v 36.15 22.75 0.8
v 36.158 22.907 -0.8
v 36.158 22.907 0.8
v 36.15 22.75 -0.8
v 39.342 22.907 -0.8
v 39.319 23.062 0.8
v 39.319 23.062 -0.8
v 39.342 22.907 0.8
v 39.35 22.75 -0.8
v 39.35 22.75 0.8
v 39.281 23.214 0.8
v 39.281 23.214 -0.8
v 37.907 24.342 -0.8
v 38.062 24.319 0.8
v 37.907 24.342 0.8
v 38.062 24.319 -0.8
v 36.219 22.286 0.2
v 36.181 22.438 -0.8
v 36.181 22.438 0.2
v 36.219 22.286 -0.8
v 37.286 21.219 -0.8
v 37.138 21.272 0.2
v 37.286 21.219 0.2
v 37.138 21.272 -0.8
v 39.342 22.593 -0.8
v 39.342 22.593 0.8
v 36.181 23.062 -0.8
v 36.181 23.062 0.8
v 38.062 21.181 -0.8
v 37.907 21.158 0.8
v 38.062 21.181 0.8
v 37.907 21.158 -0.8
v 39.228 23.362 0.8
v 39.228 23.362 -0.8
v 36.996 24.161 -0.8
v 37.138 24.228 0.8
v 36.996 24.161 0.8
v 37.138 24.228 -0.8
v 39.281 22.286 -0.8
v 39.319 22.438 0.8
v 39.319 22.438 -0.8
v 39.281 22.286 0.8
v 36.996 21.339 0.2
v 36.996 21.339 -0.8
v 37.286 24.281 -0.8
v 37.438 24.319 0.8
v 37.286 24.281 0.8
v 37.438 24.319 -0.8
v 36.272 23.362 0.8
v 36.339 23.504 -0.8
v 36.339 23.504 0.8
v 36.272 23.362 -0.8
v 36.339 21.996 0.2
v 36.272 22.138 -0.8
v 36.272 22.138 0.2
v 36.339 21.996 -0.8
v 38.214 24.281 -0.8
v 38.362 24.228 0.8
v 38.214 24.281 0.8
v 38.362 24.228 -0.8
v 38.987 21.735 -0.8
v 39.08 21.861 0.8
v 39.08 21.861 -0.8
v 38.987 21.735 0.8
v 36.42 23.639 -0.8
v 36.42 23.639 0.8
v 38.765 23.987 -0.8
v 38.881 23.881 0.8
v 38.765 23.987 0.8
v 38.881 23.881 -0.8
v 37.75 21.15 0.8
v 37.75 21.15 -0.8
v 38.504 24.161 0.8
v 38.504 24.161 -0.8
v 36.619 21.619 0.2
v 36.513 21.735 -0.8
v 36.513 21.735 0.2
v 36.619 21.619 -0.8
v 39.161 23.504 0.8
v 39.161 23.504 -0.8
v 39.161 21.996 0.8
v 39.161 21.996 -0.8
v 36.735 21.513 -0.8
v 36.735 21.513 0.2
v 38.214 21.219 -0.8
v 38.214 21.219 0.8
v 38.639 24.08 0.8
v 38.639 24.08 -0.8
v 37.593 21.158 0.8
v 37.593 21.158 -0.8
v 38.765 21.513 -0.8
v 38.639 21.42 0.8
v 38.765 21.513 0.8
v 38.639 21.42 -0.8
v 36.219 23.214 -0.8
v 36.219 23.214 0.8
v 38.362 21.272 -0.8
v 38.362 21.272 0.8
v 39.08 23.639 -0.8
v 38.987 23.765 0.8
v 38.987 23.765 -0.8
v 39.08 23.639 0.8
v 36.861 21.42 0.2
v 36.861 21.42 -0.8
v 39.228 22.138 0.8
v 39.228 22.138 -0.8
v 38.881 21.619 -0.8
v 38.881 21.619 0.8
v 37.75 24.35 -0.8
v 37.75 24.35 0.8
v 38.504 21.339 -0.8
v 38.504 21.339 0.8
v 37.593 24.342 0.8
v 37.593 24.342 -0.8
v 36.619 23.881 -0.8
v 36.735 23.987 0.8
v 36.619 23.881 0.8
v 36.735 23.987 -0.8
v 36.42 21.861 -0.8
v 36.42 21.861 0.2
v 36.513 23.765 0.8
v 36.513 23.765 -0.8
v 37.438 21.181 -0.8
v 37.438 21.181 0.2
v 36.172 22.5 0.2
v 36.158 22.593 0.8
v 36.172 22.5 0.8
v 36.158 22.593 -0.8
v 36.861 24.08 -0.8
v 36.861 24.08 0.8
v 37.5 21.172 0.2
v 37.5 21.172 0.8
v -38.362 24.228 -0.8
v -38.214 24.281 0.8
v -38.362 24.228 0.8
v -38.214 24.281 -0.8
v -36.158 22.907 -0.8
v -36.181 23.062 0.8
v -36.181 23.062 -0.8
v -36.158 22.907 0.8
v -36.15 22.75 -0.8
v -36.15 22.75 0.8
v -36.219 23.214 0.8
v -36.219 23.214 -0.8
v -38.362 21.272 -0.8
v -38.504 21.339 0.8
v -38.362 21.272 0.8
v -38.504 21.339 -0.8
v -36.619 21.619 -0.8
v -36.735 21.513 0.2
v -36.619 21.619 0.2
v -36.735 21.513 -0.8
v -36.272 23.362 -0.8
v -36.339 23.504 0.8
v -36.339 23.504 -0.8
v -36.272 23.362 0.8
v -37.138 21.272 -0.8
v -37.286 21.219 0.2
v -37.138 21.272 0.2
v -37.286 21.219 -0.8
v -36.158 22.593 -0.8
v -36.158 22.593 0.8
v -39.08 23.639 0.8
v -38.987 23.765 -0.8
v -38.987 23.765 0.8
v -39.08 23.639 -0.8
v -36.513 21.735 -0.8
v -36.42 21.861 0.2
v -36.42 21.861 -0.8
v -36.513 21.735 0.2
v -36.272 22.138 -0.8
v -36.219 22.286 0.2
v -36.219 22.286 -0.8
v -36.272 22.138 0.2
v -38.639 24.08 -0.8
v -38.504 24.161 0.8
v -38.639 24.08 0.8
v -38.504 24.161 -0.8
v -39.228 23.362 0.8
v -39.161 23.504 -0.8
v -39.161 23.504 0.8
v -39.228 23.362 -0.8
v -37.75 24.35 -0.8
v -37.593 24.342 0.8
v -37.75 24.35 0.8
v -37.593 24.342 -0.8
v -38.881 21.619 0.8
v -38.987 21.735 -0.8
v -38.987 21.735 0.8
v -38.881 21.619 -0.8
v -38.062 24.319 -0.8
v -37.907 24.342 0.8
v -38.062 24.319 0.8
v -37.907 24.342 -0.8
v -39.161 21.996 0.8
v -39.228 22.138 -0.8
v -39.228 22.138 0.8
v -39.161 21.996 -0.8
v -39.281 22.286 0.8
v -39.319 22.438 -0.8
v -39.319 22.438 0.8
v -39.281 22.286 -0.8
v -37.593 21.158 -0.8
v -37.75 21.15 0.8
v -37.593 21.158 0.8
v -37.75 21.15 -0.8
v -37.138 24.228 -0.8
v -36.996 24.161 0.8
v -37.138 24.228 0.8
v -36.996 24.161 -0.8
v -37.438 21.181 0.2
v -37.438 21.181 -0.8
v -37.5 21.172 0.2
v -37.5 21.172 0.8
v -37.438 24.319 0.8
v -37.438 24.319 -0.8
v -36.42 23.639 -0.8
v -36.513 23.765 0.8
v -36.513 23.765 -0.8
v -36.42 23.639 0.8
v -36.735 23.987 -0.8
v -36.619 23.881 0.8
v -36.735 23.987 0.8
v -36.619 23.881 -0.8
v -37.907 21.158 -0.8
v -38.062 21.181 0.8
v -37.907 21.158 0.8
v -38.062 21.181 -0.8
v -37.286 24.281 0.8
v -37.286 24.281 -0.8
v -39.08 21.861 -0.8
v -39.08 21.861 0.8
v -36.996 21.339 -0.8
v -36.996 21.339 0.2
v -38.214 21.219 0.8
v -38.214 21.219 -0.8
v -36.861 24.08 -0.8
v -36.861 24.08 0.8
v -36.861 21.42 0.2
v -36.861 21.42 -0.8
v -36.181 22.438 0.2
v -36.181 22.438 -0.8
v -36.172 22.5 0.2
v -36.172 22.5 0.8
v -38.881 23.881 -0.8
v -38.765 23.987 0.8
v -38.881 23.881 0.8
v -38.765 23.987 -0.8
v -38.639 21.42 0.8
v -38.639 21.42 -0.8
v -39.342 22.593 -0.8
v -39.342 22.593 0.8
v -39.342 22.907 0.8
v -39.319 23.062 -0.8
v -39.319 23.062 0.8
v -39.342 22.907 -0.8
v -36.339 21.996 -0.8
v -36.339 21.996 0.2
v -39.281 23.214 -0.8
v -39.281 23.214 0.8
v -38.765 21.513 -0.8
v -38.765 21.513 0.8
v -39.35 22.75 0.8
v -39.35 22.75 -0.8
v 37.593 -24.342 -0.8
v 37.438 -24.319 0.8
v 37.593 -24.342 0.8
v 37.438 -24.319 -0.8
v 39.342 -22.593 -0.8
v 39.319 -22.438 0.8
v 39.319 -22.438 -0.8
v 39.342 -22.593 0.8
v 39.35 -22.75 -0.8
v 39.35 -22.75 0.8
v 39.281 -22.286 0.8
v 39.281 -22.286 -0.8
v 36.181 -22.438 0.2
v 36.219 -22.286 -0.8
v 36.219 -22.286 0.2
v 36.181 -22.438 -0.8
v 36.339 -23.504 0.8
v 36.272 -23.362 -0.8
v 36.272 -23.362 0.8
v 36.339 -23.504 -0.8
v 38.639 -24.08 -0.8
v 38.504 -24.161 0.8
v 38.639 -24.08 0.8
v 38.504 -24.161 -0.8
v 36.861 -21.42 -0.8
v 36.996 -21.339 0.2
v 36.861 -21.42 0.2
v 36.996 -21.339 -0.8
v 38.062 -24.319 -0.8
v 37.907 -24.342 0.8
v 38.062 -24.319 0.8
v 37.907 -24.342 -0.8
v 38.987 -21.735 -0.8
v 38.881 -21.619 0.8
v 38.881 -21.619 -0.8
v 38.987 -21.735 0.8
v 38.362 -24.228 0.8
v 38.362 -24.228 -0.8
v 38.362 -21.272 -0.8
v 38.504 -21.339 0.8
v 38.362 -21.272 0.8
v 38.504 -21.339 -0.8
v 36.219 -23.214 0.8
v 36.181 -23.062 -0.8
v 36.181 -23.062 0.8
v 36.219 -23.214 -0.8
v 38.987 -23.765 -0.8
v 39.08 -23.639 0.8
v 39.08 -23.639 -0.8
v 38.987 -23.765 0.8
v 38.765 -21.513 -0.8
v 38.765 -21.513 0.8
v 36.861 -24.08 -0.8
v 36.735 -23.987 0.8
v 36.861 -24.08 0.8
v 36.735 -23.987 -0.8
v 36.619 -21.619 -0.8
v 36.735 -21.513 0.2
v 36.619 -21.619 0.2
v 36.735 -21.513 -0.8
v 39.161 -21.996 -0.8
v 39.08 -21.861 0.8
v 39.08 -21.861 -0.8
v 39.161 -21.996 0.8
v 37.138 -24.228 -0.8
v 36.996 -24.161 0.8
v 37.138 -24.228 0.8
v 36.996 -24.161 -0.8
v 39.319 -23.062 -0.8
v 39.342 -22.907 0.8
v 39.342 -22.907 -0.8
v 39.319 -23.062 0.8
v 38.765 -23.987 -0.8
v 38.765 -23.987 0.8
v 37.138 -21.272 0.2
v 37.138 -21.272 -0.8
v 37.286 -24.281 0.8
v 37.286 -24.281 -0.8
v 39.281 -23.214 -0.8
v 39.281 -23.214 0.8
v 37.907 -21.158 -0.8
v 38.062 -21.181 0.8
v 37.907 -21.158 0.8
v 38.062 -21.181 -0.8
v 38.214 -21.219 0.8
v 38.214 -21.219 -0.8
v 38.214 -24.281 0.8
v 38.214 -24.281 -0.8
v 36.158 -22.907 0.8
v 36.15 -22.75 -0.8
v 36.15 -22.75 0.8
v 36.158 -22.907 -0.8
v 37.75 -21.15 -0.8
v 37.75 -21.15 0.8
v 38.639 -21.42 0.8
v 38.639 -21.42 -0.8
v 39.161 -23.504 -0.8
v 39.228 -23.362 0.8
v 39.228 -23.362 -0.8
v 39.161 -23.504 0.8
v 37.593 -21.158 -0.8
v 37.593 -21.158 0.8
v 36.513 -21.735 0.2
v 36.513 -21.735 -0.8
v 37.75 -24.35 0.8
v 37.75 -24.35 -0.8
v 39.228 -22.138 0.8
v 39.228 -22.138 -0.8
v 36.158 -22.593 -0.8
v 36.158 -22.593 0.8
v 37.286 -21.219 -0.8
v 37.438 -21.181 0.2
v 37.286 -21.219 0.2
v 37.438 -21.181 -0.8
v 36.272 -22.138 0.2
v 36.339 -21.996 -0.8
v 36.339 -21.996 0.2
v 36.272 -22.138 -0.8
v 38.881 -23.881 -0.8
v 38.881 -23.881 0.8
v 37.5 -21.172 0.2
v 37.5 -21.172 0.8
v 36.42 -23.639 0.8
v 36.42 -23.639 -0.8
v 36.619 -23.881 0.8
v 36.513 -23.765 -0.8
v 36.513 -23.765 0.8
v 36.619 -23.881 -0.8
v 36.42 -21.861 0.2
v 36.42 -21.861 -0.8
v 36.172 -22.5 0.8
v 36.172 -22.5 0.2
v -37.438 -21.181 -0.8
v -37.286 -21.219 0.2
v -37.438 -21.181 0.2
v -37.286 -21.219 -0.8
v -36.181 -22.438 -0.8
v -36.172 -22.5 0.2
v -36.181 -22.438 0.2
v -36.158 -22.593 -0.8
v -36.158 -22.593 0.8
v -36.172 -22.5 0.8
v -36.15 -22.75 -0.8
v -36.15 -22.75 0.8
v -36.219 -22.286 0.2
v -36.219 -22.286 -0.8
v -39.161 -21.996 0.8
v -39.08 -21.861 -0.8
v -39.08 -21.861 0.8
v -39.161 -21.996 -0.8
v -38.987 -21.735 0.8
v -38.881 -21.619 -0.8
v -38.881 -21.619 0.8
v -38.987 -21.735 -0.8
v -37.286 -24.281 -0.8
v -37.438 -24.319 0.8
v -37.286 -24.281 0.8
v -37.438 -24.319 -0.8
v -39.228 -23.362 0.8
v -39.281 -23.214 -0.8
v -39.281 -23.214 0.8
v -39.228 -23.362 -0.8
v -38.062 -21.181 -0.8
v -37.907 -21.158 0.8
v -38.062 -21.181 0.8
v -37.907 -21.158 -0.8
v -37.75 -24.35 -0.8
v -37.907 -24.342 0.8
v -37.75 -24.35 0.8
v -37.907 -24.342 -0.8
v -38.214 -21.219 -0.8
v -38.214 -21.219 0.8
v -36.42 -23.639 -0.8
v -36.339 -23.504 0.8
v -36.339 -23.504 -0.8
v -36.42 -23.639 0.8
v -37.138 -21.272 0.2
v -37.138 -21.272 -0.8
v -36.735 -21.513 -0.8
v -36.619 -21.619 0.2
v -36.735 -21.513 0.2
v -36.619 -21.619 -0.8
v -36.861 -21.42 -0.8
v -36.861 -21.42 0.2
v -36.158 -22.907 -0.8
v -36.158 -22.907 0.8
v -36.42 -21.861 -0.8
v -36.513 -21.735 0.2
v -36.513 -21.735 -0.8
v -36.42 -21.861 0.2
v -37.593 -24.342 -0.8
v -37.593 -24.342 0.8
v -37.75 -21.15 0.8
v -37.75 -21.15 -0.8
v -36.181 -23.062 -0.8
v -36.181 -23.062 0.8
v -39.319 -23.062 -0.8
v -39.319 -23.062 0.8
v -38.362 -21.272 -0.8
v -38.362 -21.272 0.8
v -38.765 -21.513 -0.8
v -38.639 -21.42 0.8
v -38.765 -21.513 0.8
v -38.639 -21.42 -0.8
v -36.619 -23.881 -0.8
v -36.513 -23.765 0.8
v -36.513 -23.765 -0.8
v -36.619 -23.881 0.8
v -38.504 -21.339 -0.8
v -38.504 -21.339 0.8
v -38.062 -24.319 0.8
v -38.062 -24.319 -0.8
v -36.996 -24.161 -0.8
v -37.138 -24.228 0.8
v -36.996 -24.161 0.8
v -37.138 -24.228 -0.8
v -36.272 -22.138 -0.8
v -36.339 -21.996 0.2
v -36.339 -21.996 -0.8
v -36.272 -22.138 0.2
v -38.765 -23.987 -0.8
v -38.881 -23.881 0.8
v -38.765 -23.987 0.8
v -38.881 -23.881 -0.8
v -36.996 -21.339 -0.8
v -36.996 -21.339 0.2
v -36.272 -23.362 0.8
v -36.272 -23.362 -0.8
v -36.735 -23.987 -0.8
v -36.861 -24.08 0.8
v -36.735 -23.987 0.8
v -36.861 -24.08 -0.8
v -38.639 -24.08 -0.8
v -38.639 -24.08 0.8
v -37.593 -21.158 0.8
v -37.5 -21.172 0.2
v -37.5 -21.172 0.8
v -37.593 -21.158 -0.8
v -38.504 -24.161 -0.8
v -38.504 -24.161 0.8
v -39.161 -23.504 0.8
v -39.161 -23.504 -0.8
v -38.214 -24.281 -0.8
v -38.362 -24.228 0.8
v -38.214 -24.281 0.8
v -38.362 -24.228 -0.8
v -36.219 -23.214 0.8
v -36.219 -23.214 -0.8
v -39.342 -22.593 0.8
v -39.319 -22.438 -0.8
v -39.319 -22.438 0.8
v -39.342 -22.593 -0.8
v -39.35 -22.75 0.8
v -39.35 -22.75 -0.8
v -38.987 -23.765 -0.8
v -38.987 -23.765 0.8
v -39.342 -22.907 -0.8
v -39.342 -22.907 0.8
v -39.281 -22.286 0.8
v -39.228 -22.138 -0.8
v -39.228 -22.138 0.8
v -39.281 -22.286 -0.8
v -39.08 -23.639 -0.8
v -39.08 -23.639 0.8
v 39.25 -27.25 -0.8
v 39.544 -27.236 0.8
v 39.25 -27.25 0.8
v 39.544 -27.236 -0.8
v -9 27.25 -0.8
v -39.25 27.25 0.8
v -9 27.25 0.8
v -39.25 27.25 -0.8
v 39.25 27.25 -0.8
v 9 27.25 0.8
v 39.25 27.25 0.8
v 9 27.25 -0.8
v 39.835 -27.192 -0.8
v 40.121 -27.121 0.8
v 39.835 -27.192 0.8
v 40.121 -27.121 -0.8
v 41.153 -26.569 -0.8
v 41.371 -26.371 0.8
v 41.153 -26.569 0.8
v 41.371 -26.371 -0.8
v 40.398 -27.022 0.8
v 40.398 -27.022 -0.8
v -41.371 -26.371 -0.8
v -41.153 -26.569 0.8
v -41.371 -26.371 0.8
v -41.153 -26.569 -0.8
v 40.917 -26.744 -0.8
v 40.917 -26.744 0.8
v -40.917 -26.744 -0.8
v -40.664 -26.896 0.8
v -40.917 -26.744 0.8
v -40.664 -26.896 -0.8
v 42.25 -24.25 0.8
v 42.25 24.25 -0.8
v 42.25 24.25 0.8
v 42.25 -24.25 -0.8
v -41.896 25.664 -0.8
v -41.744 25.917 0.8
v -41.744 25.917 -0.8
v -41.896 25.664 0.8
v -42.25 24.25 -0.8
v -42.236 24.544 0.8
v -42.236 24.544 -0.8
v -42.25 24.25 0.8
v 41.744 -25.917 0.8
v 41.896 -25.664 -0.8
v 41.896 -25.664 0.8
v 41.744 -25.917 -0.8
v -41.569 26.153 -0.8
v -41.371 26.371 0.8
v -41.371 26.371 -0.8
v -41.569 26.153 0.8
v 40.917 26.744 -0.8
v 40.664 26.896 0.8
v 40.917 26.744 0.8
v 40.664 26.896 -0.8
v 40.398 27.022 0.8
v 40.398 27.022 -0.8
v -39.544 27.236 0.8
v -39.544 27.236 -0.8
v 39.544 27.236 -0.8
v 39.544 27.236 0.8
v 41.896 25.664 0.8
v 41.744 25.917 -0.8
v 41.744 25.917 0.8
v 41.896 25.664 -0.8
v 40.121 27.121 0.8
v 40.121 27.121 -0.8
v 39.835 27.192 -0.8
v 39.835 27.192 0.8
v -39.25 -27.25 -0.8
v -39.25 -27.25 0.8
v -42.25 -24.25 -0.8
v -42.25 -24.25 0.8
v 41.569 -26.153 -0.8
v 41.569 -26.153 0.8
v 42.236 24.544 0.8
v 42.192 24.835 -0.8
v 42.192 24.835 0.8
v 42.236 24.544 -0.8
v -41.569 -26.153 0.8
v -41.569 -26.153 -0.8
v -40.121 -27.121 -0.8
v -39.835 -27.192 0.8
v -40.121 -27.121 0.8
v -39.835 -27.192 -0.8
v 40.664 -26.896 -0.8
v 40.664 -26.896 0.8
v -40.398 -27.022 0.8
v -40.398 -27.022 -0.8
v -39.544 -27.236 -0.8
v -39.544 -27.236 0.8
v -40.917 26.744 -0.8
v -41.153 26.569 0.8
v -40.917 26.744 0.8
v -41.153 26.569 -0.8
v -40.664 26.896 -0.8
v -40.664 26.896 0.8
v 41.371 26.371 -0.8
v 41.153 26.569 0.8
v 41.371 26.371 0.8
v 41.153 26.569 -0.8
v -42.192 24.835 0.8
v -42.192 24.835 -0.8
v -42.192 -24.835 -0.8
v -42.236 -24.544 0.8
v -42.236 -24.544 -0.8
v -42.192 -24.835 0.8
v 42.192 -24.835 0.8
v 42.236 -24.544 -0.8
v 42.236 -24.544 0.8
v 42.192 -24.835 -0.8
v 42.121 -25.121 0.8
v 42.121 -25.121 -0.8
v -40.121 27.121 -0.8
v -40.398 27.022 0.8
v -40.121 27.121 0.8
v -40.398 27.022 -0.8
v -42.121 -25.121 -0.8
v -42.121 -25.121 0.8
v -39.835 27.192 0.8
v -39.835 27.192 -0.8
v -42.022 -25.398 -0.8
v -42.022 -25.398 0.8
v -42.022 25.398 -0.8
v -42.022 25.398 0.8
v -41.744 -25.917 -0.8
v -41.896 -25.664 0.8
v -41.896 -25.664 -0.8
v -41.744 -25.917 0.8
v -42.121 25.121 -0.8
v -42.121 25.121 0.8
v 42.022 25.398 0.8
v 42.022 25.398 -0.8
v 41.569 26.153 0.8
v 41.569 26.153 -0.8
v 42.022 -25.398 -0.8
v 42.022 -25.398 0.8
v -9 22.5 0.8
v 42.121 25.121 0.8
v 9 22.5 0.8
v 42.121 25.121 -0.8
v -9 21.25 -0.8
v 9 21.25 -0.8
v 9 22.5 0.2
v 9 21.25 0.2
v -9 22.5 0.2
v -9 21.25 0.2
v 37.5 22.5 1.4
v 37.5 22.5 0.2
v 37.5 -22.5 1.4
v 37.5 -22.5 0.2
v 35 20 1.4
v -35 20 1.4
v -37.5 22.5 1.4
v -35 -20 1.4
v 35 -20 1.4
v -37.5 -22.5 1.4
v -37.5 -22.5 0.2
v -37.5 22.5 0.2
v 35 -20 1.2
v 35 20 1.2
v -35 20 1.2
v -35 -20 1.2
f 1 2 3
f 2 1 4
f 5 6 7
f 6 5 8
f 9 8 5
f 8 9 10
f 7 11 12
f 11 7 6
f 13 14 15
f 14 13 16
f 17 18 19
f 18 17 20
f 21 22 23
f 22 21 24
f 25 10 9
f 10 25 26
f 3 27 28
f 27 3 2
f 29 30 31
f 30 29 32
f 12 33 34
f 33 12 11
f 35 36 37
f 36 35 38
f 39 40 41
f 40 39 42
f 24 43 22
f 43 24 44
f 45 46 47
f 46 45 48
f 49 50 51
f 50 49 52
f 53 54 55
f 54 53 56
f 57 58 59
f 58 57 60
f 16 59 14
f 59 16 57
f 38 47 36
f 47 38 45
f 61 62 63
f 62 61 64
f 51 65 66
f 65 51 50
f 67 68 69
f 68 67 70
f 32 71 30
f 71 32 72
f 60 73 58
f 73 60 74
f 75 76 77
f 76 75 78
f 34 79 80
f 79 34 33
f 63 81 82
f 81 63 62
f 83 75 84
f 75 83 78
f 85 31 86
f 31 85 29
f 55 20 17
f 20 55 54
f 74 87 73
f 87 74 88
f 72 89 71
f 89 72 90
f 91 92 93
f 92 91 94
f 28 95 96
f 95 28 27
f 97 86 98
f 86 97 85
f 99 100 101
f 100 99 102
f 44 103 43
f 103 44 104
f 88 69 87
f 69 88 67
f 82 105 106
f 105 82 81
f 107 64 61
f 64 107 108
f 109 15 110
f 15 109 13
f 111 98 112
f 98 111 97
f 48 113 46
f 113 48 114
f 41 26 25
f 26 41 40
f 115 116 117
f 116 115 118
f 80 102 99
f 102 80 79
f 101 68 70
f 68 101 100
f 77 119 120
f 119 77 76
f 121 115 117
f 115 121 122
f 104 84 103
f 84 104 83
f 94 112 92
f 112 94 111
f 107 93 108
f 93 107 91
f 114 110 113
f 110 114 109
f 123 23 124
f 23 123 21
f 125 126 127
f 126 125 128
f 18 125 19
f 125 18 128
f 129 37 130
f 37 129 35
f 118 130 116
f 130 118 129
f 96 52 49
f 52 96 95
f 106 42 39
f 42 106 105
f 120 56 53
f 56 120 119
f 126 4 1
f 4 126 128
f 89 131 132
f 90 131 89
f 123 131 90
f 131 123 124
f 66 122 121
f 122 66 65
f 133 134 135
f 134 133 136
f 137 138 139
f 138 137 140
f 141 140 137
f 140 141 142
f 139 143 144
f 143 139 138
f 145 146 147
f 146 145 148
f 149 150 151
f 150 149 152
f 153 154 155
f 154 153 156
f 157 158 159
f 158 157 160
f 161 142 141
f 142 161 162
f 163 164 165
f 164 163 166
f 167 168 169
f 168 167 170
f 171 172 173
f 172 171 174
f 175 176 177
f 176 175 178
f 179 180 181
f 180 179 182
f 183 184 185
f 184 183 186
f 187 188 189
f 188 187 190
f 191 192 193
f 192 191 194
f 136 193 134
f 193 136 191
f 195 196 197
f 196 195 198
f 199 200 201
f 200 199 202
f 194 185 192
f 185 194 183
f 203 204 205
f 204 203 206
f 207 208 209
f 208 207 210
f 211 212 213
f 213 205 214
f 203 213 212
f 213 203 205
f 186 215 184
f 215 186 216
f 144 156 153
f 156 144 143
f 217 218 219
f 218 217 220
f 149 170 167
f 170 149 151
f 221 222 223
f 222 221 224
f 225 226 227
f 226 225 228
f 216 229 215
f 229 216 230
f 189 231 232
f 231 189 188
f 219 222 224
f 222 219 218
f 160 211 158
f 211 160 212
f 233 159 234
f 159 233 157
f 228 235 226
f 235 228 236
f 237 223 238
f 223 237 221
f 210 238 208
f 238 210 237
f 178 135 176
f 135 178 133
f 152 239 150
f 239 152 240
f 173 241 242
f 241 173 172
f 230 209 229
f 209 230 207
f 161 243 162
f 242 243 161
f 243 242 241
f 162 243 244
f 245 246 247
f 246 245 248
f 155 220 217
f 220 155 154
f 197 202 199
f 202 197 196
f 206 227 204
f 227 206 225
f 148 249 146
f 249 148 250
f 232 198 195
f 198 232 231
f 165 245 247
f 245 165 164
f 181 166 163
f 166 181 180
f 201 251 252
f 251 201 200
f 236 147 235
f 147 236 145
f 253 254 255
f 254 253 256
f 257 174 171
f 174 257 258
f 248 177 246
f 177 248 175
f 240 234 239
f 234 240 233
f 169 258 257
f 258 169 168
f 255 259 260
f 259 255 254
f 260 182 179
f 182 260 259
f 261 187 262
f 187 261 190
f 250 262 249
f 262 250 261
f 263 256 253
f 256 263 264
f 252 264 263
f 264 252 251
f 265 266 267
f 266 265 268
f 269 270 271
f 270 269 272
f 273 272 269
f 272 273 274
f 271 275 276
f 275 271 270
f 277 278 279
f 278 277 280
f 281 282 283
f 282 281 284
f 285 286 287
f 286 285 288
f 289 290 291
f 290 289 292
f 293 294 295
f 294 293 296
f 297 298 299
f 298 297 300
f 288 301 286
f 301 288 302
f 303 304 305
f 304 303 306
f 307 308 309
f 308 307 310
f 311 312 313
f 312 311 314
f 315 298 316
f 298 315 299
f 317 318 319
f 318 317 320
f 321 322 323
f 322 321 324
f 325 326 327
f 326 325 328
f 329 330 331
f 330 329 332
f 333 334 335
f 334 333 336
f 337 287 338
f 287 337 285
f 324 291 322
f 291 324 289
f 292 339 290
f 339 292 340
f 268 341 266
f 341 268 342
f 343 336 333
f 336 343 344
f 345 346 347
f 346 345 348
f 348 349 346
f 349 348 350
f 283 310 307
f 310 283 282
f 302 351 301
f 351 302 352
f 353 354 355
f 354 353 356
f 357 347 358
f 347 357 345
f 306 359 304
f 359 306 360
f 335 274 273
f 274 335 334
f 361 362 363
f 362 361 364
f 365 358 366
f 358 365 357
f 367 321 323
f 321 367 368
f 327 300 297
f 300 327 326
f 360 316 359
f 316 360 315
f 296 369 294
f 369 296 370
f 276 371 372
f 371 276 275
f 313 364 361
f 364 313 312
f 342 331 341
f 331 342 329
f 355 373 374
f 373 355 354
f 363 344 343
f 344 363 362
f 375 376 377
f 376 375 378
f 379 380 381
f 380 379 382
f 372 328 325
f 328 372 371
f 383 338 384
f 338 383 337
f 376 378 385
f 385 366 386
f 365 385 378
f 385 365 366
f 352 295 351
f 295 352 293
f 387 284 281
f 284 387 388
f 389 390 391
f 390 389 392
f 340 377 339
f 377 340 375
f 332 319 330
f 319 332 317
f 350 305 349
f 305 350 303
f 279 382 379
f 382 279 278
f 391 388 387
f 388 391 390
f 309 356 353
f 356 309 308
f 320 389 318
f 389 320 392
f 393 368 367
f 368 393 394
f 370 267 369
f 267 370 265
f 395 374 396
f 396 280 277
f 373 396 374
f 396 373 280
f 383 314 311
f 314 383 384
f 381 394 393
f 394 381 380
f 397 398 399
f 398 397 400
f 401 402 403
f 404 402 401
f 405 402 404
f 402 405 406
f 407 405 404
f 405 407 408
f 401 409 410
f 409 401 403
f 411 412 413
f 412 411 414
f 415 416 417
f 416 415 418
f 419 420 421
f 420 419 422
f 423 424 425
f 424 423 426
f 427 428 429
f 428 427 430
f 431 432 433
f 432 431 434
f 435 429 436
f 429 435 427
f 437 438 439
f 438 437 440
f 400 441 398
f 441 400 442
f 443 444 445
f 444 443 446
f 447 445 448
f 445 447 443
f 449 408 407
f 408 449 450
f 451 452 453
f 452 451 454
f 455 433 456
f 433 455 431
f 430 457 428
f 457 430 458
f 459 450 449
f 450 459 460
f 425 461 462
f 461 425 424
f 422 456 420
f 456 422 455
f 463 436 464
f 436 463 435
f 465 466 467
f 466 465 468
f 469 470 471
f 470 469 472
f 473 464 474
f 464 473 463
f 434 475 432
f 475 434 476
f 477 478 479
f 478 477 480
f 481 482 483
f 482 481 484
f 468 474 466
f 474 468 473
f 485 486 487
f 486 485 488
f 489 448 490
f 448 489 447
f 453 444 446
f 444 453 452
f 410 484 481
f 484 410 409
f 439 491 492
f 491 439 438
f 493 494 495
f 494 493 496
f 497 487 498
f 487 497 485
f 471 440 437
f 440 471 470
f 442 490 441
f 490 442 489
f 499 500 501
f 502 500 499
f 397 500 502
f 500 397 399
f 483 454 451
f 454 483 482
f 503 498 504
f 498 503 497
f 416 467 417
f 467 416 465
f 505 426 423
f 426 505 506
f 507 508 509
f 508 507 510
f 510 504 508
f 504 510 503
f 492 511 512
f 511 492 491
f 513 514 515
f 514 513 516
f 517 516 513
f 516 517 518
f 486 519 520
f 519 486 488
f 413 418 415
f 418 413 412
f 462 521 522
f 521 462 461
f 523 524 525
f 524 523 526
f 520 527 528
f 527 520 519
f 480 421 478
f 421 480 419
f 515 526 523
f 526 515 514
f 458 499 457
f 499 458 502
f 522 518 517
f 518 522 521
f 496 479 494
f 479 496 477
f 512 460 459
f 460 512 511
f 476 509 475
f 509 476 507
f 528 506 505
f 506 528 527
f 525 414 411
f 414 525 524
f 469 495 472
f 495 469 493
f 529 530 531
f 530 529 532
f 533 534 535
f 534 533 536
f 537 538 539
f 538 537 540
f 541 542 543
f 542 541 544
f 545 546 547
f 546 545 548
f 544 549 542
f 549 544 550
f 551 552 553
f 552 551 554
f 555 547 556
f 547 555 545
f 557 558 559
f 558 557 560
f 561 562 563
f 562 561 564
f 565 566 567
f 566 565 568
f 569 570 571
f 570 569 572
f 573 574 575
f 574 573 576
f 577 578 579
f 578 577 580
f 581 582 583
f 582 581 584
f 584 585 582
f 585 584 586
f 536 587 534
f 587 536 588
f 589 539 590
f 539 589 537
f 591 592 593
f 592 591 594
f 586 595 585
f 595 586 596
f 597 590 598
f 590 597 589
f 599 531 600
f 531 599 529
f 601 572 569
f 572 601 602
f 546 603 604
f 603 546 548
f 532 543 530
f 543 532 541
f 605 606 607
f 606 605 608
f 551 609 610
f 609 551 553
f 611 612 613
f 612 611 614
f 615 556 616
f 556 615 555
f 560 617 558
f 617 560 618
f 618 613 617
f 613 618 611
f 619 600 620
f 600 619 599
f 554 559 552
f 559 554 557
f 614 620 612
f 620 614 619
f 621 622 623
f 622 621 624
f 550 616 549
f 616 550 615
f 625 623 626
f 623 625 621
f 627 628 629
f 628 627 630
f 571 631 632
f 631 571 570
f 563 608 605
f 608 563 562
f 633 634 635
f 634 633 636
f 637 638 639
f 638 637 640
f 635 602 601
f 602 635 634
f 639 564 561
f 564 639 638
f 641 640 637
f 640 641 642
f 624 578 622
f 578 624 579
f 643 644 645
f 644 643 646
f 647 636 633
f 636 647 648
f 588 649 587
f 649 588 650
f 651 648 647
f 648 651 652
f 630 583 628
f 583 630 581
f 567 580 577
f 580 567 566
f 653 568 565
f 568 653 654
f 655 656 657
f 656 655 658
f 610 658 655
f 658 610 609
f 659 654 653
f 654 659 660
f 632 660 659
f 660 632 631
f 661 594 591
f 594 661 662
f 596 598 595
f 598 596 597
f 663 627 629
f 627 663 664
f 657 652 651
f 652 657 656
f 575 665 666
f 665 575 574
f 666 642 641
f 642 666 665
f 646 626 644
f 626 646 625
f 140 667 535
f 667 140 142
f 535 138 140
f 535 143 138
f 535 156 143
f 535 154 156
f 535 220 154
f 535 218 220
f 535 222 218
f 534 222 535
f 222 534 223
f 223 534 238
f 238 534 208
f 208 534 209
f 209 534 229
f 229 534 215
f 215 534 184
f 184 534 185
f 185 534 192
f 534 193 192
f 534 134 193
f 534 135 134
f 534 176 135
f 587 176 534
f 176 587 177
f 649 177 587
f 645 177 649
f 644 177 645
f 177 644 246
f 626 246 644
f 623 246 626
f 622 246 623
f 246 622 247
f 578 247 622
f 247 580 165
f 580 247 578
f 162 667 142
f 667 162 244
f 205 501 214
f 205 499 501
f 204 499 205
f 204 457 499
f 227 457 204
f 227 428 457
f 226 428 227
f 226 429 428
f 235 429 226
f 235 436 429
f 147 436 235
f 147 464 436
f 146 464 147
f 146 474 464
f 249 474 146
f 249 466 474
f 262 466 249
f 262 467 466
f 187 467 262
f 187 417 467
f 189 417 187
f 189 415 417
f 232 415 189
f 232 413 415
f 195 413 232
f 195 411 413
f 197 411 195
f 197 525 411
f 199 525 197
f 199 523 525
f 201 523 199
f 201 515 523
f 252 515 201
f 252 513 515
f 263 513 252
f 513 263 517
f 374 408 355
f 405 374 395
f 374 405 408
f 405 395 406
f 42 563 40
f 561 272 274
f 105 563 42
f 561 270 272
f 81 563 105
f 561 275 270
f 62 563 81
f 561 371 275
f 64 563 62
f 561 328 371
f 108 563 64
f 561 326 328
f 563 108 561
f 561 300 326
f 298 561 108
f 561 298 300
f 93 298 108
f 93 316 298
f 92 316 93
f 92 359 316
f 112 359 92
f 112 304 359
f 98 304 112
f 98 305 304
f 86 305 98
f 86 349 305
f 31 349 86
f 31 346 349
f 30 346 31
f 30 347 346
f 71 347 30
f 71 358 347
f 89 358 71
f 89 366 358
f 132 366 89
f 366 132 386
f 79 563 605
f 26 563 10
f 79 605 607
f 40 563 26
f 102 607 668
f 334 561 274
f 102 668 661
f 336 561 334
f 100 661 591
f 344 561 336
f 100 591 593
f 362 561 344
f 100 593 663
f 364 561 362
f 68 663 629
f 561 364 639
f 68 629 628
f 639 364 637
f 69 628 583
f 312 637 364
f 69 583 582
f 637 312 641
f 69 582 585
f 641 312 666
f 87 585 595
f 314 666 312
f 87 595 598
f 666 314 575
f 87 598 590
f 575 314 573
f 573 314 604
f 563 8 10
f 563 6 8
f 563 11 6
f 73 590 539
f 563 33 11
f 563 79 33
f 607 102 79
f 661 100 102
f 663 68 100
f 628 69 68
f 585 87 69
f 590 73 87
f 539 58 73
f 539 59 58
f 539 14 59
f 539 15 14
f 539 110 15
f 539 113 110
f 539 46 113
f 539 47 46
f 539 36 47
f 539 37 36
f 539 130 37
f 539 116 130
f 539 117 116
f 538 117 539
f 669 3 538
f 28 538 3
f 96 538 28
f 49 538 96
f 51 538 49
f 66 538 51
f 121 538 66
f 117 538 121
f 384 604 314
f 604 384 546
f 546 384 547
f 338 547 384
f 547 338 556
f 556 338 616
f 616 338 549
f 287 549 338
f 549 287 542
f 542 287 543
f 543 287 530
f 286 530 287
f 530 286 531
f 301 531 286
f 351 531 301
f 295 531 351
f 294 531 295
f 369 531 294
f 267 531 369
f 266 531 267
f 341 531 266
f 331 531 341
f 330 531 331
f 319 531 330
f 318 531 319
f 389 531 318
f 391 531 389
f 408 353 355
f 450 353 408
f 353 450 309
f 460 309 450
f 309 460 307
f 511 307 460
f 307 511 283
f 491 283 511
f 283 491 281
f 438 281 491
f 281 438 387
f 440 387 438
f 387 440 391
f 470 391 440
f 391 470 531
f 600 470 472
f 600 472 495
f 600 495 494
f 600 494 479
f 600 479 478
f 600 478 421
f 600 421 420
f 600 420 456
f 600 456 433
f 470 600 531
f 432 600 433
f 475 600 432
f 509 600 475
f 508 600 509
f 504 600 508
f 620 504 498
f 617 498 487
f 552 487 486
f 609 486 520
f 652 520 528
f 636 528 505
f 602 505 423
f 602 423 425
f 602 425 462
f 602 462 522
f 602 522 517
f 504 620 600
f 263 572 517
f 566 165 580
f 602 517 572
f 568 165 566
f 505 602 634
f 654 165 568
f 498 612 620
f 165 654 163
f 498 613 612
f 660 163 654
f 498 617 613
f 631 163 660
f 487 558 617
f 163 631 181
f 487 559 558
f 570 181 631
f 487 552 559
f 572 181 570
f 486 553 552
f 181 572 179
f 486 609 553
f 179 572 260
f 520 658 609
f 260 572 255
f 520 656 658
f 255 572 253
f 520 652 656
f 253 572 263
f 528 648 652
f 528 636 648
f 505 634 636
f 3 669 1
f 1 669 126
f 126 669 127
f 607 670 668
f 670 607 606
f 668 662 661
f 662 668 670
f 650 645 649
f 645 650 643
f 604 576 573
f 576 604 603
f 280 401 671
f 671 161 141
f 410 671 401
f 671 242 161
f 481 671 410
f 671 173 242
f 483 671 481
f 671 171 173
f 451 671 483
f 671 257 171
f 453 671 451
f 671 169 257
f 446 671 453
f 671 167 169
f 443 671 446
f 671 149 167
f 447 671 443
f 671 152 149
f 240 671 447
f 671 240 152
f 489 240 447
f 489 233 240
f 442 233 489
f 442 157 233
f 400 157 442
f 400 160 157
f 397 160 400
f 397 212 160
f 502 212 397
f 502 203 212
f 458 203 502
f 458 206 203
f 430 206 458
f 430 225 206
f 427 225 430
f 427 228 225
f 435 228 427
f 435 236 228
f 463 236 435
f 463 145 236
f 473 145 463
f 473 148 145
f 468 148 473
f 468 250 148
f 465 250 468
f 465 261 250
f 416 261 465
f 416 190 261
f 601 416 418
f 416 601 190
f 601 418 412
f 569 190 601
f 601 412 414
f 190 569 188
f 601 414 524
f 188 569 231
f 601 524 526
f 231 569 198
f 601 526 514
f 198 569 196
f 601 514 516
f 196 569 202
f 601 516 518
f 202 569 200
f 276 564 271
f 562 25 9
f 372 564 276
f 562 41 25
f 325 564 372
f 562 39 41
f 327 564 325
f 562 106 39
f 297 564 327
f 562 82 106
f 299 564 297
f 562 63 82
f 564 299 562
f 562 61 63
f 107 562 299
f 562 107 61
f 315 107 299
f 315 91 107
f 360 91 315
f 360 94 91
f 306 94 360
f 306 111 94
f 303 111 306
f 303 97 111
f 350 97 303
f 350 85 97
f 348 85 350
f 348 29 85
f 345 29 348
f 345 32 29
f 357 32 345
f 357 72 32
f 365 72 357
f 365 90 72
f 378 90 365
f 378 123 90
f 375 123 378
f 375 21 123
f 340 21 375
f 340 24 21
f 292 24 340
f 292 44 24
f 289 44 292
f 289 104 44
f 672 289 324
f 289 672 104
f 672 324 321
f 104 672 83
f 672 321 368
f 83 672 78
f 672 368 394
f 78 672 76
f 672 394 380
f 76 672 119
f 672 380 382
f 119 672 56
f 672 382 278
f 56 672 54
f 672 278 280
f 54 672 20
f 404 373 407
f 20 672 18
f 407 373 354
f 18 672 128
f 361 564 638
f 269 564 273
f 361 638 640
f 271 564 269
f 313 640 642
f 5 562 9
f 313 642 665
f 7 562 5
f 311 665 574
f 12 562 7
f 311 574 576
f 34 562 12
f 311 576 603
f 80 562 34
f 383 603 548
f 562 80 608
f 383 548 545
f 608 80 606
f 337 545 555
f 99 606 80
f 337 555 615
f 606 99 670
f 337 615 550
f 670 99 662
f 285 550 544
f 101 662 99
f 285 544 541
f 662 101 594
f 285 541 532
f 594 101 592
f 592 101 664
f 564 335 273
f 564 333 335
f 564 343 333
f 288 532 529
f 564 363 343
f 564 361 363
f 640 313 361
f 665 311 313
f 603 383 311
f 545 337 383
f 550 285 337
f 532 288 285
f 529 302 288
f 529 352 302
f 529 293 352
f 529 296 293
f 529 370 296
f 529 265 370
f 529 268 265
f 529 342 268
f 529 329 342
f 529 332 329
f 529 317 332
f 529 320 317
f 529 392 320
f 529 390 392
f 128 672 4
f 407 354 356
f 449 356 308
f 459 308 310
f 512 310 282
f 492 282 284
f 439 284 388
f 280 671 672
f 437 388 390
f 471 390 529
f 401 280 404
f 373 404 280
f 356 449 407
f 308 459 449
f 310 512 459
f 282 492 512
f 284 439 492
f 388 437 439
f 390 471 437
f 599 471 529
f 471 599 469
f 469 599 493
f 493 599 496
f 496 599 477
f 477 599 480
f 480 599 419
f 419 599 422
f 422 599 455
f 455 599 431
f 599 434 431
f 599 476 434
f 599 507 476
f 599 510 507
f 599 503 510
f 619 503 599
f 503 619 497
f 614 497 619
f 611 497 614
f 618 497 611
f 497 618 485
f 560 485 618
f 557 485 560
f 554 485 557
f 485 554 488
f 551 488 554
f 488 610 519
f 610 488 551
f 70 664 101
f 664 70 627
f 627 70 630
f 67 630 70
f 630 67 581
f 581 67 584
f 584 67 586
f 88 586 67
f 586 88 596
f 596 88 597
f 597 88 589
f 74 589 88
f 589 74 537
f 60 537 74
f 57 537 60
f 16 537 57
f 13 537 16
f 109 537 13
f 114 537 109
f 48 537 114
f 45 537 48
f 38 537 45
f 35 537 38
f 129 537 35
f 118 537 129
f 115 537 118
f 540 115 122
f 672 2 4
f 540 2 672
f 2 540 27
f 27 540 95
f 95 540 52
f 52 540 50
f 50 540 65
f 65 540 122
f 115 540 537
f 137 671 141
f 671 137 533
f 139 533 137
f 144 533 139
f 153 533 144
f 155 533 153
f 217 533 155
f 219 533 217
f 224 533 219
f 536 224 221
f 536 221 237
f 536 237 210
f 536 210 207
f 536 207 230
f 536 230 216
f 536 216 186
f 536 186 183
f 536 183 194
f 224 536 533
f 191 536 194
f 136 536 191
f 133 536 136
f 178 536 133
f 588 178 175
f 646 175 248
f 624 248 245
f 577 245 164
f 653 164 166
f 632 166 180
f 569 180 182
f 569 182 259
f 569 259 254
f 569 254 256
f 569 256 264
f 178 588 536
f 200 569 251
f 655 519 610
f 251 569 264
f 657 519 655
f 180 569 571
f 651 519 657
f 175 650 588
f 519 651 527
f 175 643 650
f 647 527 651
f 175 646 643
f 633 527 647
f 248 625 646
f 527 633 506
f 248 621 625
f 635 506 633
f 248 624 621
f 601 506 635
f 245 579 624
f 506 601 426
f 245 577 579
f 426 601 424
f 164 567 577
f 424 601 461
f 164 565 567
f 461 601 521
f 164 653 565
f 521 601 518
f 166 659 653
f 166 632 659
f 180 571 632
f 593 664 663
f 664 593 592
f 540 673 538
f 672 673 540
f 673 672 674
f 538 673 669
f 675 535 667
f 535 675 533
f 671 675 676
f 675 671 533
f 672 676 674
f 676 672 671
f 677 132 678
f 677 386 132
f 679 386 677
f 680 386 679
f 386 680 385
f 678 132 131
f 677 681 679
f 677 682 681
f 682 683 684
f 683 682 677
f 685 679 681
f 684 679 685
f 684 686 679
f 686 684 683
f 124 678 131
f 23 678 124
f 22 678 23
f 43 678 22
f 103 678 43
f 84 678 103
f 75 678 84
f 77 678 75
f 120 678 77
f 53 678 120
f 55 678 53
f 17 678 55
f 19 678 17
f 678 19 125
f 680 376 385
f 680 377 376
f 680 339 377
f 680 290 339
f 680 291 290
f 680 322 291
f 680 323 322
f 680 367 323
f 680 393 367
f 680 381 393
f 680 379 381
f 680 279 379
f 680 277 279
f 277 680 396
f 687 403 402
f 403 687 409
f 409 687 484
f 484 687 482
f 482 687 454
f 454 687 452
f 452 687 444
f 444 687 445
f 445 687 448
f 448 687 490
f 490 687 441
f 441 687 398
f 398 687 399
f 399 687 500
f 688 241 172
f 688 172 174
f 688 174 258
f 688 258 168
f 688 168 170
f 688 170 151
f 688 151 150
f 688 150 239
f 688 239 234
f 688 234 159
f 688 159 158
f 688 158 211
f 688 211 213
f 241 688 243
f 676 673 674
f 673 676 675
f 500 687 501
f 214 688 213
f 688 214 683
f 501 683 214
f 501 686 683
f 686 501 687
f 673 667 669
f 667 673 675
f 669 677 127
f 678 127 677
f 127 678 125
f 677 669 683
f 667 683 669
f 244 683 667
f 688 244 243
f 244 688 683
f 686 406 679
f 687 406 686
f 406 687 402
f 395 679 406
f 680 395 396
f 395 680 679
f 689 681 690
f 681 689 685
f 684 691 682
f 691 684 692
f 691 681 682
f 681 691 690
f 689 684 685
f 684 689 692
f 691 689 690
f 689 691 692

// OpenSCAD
// Display module (v3.0) - 84.5mm x 54.5mm
// Single connected solid, no floating parts, no text

$fn = 64;

// Parameters
board_L = 84.5; //[42.25:169:0.1]
board_W = 54.5; //[27.25:109:0.1]
board_T = 1.6;  //[0.8:3.2:0.1]

active_L = 70;  //[35:140:0.1]
active_W = 40;  //[20:80:0.1]
active_T = 1;   //[0.5:2:0.1]
active_offset_X = 0; //[-10:10:0.1]
active_offset_Y = 0; //[-10:10:0.1]

hole_d = 3.2; //[1.6:6.4:0.1]
hole_edge_margin = 4.5; //[2.25:9:0.1]

connector_cutout_L = 18; //[9:36:0.1]
connector_cutout_W = 6;  //[3:12:0.1]
connector_cutout_edge_inset = 0; //[0:5:0.1]

bezel_wall = 2.5;   //[1.25:5:0.1]
bezel_height = 1.2; //[0.6:2.4:0.1]

fillet_r = 3; //[1.5:6:0.1]
overlap = 0.6; //[0.5:2:0.1]

// ---------- Helpers ----------
module rounded_rect_prism(L, W, H, r, center=true) {
  // Robust rounded rectangle prism using hull of corner cylinders
  // Ensures visible geometry and avoids "subtracting fillets" mistakes.
  translate(center ? [0,0,0] : [L/2, W/2, H/2])
    hull() {
      for (sx = [-1, 1], sy = [-1, 1])
        translate([sx*(L/2 - r), sy*(W/2 - r), 0])
          cylinder(h=H, r=r, center=true);
    }
}

module hole_at(x, y) {
  translate([x, y, 0])
    cylinder(h=board_T + 4*overlap, r=hole_d/2, center=true);
}

// ---------- Main solids ----------
module pcb_solid() {
  // Rounded PCB outline (fillets are part of the solid, not subtracted)
  rounded_rect_prism(board_L, board_W, board_T, fillet_r, center=true);
}

module mounting_holes_cut() {
  x = board_L/2 - hole_edge_margin;
  y = board_W/2 - hole_edge_margin;
  union() {
    hole_at( x,  y);
    hole_at(-x,  y);
    hole_at( x, -y);
    hole_at(-x, -y);
  }
}

module connector_cutout_cut() {
  // Cutout on the +Y edge, fully intersects PCB thickness
  translate([0,
             board_W/2 - connector_cutout_edge_inset - connector_cutout_W/2,
             0])
    cube([connector_cutout_L, connector_cutout_W, board_T + 4*overlap], center=true);
}

module active_area_boss() {
  // Slightly raised boss to show thickness/detail; overlaps into PCB for connectivity
  translate([active_offset_X,
             active_offset_Y,
             board_T/2 + active_T/2 - overlap])
    cube([active_L, active_W, active_T], center=true);
}

module bezel_ring() {
  // Bezel ring around active area; overlaps into PCB for connectivity
  translate([active_offset_X,
             active_offset_Y,
             board_T/2 + bezel_height/2 - overlap])
    difference() {
      cube([active_L + 2*bezel_wall, active_W + 2*bezel_wall, bezel_height], center=true);
      cube([active_L, active_W, bezel_height + 4*overlap], center=true);
    }
}

// ---------- Complete model (ONE connected solid) ----------
module complete_model() {
  union() {
    // PCB with holes and connector cutout removed
    difference() {
      pcb_solid();
      mounting_holes_cut();
      connector_cutout_cut();
    }

    // Add raised features (connected via overlap)
    active_area_boss();
    bezel_ring();
  }
}

complete_model();
